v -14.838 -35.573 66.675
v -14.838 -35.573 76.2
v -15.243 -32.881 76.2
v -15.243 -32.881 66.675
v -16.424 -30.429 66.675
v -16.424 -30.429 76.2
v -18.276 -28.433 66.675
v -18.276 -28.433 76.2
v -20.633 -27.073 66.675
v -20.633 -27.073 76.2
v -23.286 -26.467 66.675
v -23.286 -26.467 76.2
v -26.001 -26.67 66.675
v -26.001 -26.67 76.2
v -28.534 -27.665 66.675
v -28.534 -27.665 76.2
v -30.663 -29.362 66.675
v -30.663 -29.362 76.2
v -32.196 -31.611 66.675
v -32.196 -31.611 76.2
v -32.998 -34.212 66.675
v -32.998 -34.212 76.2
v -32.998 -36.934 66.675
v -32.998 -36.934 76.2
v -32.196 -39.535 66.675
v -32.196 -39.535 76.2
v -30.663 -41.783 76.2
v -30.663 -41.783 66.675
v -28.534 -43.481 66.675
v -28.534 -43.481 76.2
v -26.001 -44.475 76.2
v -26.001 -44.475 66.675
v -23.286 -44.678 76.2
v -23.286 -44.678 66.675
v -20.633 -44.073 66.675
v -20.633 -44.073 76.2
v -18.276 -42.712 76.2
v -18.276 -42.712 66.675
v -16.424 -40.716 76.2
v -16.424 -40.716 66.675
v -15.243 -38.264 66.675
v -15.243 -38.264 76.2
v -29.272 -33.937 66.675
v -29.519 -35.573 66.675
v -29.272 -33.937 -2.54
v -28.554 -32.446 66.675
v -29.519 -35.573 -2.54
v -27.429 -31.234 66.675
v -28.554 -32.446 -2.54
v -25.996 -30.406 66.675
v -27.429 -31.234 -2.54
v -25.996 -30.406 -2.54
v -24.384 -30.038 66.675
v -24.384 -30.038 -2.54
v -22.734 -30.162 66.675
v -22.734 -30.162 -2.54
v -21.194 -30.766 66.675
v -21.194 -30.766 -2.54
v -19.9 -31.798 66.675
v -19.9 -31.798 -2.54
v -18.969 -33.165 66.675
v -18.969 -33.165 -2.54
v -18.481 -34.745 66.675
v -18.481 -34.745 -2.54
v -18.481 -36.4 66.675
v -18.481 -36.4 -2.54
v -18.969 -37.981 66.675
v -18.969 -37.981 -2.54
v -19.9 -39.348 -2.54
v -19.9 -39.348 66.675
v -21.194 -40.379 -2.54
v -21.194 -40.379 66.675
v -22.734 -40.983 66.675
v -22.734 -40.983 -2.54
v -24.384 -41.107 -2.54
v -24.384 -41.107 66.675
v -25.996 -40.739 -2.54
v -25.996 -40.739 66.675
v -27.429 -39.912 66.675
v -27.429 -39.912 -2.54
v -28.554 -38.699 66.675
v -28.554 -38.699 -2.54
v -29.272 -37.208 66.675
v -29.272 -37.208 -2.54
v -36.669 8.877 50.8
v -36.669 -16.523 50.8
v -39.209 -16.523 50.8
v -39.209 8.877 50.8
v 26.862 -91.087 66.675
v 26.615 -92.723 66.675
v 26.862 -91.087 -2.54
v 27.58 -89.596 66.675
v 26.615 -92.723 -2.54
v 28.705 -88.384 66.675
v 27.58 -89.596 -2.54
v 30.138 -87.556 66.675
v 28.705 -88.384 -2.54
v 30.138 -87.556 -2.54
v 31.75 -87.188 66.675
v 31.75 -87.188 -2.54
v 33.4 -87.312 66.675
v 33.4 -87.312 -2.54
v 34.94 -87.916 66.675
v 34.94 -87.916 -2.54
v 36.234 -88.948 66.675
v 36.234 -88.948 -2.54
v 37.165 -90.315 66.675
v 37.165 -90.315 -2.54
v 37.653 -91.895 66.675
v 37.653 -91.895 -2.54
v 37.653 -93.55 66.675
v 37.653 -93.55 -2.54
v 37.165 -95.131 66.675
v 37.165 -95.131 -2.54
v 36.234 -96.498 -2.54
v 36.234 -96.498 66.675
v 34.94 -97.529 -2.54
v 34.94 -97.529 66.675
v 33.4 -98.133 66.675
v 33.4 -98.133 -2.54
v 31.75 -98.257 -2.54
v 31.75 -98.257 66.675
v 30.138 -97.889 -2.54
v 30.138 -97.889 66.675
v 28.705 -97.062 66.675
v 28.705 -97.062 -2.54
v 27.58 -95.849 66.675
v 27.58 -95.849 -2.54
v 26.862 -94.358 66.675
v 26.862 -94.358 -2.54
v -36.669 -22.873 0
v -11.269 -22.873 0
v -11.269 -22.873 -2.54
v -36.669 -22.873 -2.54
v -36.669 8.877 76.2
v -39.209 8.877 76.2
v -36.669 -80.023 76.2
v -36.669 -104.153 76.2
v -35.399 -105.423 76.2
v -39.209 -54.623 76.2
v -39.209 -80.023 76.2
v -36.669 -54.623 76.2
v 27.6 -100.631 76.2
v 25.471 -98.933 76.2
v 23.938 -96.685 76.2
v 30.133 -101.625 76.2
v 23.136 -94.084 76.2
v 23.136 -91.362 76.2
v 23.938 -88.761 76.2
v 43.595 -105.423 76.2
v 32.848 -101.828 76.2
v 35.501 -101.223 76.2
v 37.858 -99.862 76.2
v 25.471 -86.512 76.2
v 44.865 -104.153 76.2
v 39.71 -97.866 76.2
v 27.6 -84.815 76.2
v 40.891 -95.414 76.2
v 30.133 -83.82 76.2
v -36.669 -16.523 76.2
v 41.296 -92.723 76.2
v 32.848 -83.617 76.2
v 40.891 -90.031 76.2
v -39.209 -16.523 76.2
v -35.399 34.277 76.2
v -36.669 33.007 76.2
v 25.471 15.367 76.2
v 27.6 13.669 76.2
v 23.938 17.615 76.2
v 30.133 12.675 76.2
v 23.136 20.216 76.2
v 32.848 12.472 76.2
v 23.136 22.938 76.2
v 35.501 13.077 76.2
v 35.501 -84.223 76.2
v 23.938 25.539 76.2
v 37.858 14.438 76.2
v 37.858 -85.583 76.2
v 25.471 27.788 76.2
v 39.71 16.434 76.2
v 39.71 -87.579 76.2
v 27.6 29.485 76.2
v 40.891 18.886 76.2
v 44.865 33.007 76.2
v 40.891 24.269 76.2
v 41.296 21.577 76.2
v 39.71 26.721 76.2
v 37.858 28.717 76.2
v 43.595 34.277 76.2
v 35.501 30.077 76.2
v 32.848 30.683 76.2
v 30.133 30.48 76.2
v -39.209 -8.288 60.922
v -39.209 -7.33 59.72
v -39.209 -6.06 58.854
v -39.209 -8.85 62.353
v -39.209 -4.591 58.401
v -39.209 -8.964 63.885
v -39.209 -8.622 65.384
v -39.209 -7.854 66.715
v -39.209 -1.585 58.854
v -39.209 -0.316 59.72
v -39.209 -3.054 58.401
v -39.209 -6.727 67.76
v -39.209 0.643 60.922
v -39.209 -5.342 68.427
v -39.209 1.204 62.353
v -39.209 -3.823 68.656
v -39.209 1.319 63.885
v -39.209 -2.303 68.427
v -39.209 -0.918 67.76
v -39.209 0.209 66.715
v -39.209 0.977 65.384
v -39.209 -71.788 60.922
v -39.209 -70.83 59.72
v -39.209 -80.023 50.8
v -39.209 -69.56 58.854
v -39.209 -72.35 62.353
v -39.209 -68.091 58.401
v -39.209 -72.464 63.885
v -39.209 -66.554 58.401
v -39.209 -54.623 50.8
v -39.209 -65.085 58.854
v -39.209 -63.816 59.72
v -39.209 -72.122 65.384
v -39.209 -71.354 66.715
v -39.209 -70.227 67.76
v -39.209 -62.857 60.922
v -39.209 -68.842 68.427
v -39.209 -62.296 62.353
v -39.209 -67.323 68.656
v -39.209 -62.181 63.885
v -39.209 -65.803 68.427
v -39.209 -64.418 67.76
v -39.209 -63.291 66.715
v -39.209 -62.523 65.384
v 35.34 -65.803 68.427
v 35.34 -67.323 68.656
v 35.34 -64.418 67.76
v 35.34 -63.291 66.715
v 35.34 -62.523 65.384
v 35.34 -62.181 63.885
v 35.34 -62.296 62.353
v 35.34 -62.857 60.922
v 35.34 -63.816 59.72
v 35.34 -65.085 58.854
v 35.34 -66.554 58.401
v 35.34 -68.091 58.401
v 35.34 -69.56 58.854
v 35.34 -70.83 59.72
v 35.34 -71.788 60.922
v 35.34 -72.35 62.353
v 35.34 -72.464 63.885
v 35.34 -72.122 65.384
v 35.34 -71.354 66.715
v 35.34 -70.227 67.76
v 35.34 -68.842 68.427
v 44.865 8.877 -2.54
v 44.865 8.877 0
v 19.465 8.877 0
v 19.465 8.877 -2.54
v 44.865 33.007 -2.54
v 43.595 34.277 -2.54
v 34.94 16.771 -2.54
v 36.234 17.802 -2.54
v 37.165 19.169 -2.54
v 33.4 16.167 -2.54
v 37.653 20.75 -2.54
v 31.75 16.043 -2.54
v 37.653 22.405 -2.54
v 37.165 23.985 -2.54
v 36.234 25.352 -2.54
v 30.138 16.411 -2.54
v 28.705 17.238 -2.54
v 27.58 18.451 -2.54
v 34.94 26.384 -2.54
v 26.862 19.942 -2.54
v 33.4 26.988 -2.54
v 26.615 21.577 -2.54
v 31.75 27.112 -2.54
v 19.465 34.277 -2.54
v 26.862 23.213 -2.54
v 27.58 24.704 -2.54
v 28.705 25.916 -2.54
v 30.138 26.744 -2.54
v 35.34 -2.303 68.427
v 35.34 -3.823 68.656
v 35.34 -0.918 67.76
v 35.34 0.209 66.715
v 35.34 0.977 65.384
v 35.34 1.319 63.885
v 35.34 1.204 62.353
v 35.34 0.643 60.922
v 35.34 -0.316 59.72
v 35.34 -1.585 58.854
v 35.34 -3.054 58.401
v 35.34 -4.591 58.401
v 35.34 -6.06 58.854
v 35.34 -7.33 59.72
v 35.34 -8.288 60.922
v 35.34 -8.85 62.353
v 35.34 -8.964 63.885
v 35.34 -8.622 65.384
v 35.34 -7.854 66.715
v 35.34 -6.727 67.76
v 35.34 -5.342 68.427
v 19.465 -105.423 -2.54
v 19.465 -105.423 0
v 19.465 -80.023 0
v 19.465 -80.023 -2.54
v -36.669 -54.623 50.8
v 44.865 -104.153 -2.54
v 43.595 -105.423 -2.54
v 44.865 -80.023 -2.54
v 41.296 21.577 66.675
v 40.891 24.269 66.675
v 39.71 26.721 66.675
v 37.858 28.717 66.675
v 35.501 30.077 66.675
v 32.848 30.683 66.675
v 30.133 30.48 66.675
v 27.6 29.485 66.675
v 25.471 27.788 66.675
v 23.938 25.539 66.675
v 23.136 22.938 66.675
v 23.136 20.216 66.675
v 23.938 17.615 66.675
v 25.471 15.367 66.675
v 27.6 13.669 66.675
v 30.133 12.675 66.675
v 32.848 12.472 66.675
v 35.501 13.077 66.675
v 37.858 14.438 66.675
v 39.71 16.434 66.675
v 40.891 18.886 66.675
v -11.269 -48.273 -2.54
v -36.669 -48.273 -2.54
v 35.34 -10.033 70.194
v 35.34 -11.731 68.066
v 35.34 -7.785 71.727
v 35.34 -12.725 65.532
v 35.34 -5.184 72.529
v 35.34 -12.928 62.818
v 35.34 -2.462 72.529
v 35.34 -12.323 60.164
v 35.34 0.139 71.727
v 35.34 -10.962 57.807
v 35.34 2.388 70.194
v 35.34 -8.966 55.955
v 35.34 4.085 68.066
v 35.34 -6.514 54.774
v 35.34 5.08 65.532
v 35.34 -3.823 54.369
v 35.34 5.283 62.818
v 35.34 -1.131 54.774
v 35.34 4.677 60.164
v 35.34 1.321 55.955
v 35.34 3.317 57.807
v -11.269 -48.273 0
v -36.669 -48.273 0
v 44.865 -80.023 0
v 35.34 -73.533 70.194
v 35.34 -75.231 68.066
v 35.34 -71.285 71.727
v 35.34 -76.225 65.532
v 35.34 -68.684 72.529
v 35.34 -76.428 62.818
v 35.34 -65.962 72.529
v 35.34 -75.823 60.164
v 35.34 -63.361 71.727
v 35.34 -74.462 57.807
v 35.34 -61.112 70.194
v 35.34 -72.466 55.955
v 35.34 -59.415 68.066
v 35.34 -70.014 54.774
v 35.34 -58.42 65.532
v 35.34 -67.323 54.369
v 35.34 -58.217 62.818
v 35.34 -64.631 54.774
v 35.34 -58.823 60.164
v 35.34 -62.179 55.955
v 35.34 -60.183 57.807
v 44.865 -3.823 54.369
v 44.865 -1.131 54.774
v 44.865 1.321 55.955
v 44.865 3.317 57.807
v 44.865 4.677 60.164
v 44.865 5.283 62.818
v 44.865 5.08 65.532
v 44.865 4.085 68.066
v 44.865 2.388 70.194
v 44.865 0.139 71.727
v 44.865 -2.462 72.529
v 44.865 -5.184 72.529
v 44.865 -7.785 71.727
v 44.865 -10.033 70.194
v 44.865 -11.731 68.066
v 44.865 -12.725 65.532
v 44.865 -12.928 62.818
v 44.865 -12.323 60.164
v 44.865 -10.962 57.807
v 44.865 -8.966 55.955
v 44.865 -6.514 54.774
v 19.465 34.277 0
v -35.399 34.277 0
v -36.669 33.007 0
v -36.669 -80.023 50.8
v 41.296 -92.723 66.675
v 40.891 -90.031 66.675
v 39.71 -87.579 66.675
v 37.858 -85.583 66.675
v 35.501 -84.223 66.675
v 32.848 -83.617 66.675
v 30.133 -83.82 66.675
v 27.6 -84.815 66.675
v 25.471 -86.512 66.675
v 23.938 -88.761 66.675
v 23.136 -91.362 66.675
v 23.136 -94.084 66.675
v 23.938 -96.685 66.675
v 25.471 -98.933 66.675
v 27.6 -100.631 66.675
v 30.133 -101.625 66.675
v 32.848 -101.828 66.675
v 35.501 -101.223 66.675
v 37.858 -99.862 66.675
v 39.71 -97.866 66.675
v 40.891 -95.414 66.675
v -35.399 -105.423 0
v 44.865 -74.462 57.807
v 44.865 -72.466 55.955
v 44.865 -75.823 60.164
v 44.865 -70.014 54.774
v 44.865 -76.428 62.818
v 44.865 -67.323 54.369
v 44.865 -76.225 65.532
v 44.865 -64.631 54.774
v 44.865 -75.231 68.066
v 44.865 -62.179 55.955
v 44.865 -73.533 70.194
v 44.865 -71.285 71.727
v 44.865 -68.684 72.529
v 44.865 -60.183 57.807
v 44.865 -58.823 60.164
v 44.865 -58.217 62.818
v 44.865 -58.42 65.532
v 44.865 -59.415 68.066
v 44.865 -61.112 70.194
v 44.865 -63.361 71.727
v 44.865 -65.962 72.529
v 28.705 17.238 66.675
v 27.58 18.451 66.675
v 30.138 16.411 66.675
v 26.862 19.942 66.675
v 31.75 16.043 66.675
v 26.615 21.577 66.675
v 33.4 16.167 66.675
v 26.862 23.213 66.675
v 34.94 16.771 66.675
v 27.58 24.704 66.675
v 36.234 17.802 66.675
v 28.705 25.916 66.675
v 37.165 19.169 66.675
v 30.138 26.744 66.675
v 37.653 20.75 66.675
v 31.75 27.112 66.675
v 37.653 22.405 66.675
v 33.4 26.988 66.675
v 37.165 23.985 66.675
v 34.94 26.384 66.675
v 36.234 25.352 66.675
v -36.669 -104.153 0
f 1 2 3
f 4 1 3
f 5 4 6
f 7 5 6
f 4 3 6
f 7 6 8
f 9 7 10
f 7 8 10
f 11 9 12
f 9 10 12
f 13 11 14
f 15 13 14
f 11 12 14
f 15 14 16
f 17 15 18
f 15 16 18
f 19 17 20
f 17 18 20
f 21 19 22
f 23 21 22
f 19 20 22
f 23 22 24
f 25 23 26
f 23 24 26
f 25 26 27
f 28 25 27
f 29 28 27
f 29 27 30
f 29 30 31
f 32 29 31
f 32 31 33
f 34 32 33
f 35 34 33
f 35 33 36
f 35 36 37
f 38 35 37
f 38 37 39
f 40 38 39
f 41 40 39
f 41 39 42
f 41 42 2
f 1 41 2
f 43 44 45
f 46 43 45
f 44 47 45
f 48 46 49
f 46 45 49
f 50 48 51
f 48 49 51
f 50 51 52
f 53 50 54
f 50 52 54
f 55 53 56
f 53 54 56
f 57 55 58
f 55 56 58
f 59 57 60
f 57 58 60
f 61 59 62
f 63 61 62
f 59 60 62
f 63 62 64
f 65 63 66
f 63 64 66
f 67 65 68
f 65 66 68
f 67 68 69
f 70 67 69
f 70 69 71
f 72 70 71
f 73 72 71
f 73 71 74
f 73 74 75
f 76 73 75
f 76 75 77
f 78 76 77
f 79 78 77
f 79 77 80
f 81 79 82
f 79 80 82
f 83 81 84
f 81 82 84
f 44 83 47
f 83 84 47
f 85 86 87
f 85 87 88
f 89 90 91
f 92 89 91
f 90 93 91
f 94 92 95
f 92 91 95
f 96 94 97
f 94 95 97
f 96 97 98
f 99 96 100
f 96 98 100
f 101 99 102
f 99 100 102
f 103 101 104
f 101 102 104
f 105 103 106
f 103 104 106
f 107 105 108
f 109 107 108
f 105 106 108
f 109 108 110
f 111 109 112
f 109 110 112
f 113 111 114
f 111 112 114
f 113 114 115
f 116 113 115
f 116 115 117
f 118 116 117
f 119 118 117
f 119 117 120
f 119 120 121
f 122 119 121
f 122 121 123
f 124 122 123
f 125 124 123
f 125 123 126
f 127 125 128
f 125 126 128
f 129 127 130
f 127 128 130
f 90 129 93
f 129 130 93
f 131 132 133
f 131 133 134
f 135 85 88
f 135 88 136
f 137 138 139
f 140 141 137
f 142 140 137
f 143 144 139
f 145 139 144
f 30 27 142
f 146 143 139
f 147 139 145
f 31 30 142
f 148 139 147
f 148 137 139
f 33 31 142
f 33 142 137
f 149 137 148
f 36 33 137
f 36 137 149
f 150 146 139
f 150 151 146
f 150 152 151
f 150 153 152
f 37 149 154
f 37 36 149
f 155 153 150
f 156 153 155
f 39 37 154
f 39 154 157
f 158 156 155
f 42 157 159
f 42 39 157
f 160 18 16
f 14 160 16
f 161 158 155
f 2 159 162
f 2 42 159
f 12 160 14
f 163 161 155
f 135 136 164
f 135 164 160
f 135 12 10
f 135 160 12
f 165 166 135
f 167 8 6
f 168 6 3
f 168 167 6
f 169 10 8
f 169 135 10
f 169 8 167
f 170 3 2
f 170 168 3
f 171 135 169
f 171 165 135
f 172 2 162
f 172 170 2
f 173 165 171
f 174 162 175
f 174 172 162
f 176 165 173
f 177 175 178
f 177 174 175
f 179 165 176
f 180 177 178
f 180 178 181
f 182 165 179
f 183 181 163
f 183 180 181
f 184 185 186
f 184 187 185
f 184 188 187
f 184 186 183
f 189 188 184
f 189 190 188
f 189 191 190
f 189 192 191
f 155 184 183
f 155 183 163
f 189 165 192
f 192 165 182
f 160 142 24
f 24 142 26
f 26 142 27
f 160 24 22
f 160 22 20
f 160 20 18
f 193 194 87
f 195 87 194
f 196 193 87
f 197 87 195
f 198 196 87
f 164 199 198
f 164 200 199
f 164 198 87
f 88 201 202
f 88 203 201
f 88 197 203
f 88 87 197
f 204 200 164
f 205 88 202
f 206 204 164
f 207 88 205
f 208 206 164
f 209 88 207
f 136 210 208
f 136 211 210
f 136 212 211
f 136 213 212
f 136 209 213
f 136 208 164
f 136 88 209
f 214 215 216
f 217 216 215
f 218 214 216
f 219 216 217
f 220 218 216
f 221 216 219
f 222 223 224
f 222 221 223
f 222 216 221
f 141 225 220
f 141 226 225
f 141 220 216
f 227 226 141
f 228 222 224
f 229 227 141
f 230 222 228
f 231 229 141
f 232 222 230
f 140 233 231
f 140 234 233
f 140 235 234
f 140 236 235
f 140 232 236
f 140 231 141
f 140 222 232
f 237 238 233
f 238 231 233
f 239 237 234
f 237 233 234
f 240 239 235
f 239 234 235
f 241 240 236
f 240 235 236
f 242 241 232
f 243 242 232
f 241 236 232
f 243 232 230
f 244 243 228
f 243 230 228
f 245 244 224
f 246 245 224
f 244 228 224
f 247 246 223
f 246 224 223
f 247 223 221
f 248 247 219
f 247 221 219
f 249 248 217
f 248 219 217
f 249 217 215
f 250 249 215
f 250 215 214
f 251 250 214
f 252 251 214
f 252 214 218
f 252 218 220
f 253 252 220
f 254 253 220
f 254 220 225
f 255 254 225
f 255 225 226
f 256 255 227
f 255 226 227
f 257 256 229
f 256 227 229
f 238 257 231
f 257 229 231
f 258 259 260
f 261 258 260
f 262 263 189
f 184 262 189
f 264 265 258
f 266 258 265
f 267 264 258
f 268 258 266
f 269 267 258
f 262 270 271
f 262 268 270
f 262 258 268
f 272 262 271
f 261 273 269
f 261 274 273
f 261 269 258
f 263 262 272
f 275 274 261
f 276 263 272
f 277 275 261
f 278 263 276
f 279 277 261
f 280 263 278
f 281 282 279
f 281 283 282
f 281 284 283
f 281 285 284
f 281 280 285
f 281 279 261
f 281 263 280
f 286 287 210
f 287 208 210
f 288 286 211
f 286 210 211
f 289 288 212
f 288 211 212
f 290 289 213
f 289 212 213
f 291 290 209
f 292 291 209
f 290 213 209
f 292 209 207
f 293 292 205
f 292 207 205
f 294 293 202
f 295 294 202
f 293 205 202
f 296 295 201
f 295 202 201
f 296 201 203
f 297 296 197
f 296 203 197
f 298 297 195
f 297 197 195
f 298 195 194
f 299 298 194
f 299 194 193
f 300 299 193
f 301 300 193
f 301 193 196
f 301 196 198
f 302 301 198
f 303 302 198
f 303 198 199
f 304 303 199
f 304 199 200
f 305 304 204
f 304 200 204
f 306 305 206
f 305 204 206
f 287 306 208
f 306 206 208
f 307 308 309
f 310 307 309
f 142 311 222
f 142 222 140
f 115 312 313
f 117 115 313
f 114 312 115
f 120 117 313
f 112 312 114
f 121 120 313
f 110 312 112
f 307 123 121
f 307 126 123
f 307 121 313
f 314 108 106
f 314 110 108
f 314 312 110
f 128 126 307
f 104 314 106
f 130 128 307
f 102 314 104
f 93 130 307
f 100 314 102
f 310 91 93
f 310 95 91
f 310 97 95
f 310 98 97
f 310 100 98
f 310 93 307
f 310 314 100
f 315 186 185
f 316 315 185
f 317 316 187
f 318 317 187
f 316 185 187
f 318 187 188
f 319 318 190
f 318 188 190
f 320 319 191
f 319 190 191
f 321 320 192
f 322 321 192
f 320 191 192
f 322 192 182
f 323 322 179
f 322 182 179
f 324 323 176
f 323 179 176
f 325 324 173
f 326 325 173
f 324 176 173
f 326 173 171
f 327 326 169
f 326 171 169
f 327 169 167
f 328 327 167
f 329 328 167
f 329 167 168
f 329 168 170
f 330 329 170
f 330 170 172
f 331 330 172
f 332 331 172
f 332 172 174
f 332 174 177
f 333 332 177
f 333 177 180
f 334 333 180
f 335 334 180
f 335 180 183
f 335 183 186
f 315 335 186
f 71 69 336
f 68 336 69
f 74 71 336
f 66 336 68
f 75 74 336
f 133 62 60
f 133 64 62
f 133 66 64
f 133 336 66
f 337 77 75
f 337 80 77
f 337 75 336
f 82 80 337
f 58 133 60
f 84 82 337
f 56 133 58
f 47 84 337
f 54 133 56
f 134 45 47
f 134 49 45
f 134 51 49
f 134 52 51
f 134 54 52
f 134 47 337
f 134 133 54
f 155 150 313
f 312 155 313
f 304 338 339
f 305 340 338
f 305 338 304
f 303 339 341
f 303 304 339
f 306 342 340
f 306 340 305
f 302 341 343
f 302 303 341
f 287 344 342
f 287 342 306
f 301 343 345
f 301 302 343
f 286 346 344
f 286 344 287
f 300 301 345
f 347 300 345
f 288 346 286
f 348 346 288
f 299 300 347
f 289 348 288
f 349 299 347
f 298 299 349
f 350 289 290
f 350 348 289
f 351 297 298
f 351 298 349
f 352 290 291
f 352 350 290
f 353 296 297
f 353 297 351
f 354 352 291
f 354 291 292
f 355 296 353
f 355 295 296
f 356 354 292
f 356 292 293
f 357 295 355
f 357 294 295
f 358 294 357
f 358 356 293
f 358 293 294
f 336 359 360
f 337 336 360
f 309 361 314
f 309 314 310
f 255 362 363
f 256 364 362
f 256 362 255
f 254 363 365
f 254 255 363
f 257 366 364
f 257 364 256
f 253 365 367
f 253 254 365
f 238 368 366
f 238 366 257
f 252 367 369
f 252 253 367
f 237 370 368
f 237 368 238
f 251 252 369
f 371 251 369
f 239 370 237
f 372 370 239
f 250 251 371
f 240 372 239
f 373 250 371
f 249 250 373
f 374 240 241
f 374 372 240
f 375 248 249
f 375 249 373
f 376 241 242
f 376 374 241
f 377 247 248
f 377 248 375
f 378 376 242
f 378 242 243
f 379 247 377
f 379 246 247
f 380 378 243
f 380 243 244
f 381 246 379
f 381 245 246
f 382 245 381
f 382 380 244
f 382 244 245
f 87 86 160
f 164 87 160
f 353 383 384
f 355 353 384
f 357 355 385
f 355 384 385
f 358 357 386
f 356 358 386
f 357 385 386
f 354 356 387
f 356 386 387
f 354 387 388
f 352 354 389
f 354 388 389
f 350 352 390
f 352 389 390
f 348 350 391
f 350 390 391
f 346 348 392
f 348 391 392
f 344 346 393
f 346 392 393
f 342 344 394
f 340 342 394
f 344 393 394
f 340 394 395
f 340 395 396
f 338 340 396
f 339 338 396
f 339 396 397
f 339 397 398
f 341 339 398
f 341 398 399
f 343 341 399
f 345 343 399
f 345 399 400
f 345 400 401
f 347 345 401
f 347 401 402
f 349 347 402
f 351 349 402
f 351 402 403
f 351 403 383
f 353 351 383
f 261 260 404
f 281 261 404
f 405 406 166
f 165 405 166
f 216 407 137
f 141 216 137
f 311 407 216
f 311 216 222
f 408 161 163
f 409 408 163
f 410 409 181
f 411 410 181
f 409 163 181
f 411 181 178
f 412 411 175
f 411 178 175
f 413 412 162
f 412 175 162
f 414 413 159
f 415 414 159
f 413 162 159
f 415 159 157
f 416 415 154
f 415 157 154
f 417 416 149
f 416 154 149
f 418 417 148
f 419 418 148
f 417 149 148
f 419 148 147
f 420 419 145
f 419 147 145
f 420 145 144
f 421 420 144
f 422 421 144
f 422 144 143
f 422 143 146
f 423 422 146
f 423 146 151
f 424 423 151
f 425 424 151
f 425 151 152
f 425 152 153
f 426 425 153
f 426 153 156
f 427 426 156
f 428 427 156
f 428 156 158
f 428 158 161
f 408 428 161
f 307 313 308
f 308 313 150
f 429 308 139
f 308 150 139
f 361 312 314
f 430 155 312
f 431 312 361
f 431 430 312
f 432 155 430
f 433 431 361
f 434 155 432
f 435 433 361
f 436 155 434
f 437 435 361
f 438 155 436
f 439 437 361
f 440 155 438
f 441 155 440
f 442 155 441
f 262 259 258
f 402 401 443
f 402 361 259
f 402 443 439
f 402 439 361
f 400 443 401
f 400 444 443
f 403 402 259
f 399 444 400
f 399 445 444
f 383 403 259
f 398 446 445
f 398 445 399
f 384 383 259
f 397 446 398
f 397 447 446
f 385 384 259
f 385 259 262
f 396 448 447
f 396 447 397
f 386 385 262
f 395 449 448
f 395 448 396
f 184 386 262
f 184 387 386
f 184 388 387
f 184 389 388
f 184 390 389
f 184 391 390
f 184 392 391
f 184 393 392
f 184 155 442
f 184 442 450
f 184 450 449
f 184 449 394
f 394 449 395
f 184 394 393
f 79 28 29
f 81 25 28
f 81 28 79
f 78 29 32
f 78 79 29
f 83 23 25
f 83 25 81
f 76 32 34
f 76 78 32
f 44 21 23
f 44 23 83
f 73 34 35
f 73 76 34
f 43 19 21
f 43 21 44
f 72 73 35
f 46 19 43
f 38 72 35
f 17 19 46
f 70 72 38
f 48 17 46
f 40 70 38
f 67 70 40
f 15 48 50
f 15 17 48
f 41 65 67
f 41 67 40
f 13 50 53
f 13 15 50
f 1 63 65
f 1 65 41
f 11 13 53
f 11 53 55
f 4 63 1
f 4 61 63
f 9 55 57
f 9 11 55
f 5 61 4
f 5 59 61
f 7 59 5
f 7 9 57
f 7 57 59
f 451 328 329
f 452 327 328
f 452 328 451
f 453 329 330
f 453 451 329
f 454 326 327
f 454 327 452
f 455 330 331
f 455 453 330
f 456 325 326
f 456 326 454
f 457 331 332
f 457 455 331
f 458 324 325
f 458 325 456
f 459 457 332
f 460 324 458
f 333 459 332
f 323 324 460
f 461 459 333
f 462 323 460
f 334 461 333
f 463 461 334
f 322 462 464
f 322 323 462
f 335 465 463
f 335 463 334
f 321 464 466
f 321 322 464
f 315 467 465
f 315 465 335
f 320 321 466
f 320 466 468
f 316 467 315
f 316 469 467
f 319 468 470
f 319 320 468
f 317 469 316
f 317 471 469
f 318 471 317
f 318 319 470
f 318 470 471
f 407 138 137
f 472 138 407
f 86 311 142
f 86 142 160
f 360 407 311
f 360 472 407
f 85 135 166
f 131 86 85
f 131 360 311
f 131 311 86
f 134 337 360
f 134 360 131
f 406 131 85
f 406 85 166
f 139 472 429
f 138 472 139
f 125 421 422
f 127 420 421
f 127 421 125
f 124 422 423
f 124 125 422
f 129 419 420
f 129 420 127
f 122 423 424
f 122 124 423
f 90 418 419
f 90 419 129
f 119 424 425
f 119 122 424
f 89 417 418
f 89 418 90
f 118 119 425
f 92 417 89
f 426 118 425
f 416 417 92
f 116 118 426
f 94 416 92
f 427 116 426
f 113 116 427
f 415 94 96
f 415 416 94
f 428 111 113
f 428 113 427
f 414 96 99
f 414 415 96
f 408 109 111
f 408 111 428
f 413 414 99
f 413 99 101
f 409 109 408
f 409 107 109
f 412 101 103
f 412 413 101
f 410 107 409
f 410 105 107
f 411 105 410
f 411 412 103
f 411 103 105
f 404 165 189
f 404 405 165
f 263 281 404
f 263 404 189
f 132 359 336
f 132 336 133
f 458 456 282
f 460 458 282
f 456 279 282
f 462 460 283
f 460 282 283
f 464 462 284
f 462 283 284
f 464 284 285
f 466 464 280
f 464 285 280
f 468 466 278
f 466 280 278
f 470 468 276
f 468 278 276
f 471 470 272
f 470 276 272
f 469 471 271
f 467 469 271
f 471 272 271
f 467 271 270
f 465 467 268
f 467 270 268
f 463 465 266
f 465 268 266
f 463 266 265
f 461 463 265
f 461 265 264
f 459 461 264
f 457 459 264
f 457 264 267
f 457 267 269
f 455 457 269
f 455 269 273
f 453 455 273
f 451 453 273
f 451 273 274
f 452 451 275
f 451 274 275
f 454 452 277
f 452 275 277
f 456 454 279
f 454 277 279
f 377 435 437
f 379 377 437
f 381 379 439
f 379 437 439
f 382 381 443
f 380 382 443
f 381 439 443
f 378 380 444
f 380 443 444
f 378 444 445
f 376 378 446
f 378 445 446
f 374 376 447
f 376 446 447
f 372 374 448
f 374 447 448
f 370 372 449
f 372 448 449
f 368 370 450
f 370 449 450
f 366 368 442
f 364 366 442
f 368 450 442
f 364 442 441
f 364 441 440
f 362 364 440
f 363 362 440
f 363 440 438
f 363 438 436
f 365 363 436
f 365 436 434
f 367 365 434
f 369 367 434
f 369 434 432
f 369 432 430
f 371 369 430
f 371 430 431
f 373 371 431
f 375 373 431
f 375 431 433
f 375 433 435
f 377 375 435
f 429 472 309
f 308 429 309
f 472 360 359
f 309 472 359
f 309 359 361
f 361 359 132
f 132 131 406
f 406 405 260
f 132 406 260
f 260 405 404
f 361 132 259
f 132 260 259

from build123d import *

# Parameters (mm, degrees)
SKETCH1_W                                        = 81.534
SKETCH1_H                                        = 139.7
EXTRUDE1_DEPTH                                   = 76.2
SKETCH8_W                                        = 25.4
SKETCH8_H                                        = 25.4
EXTRUDE2_DEPTH                                   = 2.54
CBORE_FOR_3_8_SOCKET_HEAD_CAP_SCREW1_D           = 11.0998
CBORE_FOR_3_8_SOCKET_HEAD_CAP_SCREW1_CBORE_D     = 18.2626
CBORE_FOR_3_8_SOCKET_HEAD_CAP_SCREW1_CBORE_DEPTH = 9.525
SKETCH9_W                                        = 25.4
SKETCH9_H                                        = 25.4
EXTRUDE3_DEPTH                                   = 2.54
CBORE_FOR_3_8_SOCKET_HEAD_CAP_SCREW3_D           = 10.3124
CBORE_FOR_3_8_SOCKET_HEAD_CAP_SCREW3_CBORE_D     = 18.2626
CBORE_FOR_3_8_SOCKET_HEAD_CAP_SCREW3_CBORE_DEPTH = 9.525
CHAMFER1_SIZE                                    = 1.27


with BuildPart() as part:
    # Sketch1 → Extrude1 (new body)
    with BuildSketch(Plane.XY):
        with Locations((4.098167124, -35.572612746)):
            Rectangle(SKETCH1_W, SKETCH1_H)
    extrude(amount=EXTRUDE1_DEPTH)

    # Sketch8 → Extrude2 (add)
    with BuildSketch(Plane(origin=(0, 0, 0), x_dir=(-1, 0, 0), z_dir=(0, 0, -1))):
        with Locations((-32.165167124, -92.722612746)):
            Rectangle(SKETCH8_W, SKETCH8_H)
        with Locations((-32.165167124, 21.577387254)):
            Rectangle(SKETCH8_W, SKETCH8_H)
        with Locations((23.968832876, -35.572612746)):
            Rectangle(SKETCH8_W, SKETCH8_H)
    extrude(amount=EXTRUDE2_DEPTH)

    # CBORE for 3/8 Socket Head Cap Screw1 (through all)
    with Locations(Plane.XY.offset(76.2)):
        with Locations((-23.968832876, -35.572612746), (32.165167124, 21.577387254), (32.165167124, -92.722612746)):
            CounterBoreHole(CBORE_FOR_3_8_SOCKET_HEAD_CAP_SCREW1_D / 2, CBORE_FOR_3_8_SOCKET_HEAD_CAP_SCREW1_CBORE_D / 2, CBORE_FOR_3_8_SOCKET_HEAD_CAP_SCREW1_CBORE_DEPTH)

    # Sketch9 → Extrude3 (add)
    with BuildSketch(Plane.ZY.offset(36.668832876)):
        with Locations((63.5, -3.822612746)):
            Rectangle(SKETCH9_W, SKETCH9_H)
        with Locations((63.5, -67.322612746)):
            Rectangle(SKETCH9_W, SKETCH9_H)
    extrude(amount=EXTRUDE3_DEPTH)

    # CBORE for 3/8 Socket Head Cap Screw3 (through all)
    with Locations(Plane(origin=(44.865167124, 0, 0), x_dir=(0, 0, -1), z_dir=(1, 0, 0))):
        with Locations((-63.5, -3.822612746), (-63.5, -67.322612746)):
            CounterBoreHole(CBORE_FOR_3_8_SOCKET_HEAD_CAP_SCREW3_D / 2, CBORE_FOR_3_8_SOCKET_HEAD_CAP_SCREW3_CBORE_D / 2, CBORE_FOR_3_8_SOCKET_HEAD_CAP_SCREW3_CBORE_DEPTH)

    # Chamfer1
    chamfer1_edges = [part.edges().sort_by_distance(p)[0] for p in [
        (44.865167124, 34.277387254, 36.83),
        (-36.668832876, 34.277387254, 38.1),
        (44.865167124, -105.422612746, 36.83),
        (-36.668832876, -105.422612746, 38.1),
    ]]
    chamfer(chamfer1_edges, length=CHAMFER1_SIZE)


solid = part.part
